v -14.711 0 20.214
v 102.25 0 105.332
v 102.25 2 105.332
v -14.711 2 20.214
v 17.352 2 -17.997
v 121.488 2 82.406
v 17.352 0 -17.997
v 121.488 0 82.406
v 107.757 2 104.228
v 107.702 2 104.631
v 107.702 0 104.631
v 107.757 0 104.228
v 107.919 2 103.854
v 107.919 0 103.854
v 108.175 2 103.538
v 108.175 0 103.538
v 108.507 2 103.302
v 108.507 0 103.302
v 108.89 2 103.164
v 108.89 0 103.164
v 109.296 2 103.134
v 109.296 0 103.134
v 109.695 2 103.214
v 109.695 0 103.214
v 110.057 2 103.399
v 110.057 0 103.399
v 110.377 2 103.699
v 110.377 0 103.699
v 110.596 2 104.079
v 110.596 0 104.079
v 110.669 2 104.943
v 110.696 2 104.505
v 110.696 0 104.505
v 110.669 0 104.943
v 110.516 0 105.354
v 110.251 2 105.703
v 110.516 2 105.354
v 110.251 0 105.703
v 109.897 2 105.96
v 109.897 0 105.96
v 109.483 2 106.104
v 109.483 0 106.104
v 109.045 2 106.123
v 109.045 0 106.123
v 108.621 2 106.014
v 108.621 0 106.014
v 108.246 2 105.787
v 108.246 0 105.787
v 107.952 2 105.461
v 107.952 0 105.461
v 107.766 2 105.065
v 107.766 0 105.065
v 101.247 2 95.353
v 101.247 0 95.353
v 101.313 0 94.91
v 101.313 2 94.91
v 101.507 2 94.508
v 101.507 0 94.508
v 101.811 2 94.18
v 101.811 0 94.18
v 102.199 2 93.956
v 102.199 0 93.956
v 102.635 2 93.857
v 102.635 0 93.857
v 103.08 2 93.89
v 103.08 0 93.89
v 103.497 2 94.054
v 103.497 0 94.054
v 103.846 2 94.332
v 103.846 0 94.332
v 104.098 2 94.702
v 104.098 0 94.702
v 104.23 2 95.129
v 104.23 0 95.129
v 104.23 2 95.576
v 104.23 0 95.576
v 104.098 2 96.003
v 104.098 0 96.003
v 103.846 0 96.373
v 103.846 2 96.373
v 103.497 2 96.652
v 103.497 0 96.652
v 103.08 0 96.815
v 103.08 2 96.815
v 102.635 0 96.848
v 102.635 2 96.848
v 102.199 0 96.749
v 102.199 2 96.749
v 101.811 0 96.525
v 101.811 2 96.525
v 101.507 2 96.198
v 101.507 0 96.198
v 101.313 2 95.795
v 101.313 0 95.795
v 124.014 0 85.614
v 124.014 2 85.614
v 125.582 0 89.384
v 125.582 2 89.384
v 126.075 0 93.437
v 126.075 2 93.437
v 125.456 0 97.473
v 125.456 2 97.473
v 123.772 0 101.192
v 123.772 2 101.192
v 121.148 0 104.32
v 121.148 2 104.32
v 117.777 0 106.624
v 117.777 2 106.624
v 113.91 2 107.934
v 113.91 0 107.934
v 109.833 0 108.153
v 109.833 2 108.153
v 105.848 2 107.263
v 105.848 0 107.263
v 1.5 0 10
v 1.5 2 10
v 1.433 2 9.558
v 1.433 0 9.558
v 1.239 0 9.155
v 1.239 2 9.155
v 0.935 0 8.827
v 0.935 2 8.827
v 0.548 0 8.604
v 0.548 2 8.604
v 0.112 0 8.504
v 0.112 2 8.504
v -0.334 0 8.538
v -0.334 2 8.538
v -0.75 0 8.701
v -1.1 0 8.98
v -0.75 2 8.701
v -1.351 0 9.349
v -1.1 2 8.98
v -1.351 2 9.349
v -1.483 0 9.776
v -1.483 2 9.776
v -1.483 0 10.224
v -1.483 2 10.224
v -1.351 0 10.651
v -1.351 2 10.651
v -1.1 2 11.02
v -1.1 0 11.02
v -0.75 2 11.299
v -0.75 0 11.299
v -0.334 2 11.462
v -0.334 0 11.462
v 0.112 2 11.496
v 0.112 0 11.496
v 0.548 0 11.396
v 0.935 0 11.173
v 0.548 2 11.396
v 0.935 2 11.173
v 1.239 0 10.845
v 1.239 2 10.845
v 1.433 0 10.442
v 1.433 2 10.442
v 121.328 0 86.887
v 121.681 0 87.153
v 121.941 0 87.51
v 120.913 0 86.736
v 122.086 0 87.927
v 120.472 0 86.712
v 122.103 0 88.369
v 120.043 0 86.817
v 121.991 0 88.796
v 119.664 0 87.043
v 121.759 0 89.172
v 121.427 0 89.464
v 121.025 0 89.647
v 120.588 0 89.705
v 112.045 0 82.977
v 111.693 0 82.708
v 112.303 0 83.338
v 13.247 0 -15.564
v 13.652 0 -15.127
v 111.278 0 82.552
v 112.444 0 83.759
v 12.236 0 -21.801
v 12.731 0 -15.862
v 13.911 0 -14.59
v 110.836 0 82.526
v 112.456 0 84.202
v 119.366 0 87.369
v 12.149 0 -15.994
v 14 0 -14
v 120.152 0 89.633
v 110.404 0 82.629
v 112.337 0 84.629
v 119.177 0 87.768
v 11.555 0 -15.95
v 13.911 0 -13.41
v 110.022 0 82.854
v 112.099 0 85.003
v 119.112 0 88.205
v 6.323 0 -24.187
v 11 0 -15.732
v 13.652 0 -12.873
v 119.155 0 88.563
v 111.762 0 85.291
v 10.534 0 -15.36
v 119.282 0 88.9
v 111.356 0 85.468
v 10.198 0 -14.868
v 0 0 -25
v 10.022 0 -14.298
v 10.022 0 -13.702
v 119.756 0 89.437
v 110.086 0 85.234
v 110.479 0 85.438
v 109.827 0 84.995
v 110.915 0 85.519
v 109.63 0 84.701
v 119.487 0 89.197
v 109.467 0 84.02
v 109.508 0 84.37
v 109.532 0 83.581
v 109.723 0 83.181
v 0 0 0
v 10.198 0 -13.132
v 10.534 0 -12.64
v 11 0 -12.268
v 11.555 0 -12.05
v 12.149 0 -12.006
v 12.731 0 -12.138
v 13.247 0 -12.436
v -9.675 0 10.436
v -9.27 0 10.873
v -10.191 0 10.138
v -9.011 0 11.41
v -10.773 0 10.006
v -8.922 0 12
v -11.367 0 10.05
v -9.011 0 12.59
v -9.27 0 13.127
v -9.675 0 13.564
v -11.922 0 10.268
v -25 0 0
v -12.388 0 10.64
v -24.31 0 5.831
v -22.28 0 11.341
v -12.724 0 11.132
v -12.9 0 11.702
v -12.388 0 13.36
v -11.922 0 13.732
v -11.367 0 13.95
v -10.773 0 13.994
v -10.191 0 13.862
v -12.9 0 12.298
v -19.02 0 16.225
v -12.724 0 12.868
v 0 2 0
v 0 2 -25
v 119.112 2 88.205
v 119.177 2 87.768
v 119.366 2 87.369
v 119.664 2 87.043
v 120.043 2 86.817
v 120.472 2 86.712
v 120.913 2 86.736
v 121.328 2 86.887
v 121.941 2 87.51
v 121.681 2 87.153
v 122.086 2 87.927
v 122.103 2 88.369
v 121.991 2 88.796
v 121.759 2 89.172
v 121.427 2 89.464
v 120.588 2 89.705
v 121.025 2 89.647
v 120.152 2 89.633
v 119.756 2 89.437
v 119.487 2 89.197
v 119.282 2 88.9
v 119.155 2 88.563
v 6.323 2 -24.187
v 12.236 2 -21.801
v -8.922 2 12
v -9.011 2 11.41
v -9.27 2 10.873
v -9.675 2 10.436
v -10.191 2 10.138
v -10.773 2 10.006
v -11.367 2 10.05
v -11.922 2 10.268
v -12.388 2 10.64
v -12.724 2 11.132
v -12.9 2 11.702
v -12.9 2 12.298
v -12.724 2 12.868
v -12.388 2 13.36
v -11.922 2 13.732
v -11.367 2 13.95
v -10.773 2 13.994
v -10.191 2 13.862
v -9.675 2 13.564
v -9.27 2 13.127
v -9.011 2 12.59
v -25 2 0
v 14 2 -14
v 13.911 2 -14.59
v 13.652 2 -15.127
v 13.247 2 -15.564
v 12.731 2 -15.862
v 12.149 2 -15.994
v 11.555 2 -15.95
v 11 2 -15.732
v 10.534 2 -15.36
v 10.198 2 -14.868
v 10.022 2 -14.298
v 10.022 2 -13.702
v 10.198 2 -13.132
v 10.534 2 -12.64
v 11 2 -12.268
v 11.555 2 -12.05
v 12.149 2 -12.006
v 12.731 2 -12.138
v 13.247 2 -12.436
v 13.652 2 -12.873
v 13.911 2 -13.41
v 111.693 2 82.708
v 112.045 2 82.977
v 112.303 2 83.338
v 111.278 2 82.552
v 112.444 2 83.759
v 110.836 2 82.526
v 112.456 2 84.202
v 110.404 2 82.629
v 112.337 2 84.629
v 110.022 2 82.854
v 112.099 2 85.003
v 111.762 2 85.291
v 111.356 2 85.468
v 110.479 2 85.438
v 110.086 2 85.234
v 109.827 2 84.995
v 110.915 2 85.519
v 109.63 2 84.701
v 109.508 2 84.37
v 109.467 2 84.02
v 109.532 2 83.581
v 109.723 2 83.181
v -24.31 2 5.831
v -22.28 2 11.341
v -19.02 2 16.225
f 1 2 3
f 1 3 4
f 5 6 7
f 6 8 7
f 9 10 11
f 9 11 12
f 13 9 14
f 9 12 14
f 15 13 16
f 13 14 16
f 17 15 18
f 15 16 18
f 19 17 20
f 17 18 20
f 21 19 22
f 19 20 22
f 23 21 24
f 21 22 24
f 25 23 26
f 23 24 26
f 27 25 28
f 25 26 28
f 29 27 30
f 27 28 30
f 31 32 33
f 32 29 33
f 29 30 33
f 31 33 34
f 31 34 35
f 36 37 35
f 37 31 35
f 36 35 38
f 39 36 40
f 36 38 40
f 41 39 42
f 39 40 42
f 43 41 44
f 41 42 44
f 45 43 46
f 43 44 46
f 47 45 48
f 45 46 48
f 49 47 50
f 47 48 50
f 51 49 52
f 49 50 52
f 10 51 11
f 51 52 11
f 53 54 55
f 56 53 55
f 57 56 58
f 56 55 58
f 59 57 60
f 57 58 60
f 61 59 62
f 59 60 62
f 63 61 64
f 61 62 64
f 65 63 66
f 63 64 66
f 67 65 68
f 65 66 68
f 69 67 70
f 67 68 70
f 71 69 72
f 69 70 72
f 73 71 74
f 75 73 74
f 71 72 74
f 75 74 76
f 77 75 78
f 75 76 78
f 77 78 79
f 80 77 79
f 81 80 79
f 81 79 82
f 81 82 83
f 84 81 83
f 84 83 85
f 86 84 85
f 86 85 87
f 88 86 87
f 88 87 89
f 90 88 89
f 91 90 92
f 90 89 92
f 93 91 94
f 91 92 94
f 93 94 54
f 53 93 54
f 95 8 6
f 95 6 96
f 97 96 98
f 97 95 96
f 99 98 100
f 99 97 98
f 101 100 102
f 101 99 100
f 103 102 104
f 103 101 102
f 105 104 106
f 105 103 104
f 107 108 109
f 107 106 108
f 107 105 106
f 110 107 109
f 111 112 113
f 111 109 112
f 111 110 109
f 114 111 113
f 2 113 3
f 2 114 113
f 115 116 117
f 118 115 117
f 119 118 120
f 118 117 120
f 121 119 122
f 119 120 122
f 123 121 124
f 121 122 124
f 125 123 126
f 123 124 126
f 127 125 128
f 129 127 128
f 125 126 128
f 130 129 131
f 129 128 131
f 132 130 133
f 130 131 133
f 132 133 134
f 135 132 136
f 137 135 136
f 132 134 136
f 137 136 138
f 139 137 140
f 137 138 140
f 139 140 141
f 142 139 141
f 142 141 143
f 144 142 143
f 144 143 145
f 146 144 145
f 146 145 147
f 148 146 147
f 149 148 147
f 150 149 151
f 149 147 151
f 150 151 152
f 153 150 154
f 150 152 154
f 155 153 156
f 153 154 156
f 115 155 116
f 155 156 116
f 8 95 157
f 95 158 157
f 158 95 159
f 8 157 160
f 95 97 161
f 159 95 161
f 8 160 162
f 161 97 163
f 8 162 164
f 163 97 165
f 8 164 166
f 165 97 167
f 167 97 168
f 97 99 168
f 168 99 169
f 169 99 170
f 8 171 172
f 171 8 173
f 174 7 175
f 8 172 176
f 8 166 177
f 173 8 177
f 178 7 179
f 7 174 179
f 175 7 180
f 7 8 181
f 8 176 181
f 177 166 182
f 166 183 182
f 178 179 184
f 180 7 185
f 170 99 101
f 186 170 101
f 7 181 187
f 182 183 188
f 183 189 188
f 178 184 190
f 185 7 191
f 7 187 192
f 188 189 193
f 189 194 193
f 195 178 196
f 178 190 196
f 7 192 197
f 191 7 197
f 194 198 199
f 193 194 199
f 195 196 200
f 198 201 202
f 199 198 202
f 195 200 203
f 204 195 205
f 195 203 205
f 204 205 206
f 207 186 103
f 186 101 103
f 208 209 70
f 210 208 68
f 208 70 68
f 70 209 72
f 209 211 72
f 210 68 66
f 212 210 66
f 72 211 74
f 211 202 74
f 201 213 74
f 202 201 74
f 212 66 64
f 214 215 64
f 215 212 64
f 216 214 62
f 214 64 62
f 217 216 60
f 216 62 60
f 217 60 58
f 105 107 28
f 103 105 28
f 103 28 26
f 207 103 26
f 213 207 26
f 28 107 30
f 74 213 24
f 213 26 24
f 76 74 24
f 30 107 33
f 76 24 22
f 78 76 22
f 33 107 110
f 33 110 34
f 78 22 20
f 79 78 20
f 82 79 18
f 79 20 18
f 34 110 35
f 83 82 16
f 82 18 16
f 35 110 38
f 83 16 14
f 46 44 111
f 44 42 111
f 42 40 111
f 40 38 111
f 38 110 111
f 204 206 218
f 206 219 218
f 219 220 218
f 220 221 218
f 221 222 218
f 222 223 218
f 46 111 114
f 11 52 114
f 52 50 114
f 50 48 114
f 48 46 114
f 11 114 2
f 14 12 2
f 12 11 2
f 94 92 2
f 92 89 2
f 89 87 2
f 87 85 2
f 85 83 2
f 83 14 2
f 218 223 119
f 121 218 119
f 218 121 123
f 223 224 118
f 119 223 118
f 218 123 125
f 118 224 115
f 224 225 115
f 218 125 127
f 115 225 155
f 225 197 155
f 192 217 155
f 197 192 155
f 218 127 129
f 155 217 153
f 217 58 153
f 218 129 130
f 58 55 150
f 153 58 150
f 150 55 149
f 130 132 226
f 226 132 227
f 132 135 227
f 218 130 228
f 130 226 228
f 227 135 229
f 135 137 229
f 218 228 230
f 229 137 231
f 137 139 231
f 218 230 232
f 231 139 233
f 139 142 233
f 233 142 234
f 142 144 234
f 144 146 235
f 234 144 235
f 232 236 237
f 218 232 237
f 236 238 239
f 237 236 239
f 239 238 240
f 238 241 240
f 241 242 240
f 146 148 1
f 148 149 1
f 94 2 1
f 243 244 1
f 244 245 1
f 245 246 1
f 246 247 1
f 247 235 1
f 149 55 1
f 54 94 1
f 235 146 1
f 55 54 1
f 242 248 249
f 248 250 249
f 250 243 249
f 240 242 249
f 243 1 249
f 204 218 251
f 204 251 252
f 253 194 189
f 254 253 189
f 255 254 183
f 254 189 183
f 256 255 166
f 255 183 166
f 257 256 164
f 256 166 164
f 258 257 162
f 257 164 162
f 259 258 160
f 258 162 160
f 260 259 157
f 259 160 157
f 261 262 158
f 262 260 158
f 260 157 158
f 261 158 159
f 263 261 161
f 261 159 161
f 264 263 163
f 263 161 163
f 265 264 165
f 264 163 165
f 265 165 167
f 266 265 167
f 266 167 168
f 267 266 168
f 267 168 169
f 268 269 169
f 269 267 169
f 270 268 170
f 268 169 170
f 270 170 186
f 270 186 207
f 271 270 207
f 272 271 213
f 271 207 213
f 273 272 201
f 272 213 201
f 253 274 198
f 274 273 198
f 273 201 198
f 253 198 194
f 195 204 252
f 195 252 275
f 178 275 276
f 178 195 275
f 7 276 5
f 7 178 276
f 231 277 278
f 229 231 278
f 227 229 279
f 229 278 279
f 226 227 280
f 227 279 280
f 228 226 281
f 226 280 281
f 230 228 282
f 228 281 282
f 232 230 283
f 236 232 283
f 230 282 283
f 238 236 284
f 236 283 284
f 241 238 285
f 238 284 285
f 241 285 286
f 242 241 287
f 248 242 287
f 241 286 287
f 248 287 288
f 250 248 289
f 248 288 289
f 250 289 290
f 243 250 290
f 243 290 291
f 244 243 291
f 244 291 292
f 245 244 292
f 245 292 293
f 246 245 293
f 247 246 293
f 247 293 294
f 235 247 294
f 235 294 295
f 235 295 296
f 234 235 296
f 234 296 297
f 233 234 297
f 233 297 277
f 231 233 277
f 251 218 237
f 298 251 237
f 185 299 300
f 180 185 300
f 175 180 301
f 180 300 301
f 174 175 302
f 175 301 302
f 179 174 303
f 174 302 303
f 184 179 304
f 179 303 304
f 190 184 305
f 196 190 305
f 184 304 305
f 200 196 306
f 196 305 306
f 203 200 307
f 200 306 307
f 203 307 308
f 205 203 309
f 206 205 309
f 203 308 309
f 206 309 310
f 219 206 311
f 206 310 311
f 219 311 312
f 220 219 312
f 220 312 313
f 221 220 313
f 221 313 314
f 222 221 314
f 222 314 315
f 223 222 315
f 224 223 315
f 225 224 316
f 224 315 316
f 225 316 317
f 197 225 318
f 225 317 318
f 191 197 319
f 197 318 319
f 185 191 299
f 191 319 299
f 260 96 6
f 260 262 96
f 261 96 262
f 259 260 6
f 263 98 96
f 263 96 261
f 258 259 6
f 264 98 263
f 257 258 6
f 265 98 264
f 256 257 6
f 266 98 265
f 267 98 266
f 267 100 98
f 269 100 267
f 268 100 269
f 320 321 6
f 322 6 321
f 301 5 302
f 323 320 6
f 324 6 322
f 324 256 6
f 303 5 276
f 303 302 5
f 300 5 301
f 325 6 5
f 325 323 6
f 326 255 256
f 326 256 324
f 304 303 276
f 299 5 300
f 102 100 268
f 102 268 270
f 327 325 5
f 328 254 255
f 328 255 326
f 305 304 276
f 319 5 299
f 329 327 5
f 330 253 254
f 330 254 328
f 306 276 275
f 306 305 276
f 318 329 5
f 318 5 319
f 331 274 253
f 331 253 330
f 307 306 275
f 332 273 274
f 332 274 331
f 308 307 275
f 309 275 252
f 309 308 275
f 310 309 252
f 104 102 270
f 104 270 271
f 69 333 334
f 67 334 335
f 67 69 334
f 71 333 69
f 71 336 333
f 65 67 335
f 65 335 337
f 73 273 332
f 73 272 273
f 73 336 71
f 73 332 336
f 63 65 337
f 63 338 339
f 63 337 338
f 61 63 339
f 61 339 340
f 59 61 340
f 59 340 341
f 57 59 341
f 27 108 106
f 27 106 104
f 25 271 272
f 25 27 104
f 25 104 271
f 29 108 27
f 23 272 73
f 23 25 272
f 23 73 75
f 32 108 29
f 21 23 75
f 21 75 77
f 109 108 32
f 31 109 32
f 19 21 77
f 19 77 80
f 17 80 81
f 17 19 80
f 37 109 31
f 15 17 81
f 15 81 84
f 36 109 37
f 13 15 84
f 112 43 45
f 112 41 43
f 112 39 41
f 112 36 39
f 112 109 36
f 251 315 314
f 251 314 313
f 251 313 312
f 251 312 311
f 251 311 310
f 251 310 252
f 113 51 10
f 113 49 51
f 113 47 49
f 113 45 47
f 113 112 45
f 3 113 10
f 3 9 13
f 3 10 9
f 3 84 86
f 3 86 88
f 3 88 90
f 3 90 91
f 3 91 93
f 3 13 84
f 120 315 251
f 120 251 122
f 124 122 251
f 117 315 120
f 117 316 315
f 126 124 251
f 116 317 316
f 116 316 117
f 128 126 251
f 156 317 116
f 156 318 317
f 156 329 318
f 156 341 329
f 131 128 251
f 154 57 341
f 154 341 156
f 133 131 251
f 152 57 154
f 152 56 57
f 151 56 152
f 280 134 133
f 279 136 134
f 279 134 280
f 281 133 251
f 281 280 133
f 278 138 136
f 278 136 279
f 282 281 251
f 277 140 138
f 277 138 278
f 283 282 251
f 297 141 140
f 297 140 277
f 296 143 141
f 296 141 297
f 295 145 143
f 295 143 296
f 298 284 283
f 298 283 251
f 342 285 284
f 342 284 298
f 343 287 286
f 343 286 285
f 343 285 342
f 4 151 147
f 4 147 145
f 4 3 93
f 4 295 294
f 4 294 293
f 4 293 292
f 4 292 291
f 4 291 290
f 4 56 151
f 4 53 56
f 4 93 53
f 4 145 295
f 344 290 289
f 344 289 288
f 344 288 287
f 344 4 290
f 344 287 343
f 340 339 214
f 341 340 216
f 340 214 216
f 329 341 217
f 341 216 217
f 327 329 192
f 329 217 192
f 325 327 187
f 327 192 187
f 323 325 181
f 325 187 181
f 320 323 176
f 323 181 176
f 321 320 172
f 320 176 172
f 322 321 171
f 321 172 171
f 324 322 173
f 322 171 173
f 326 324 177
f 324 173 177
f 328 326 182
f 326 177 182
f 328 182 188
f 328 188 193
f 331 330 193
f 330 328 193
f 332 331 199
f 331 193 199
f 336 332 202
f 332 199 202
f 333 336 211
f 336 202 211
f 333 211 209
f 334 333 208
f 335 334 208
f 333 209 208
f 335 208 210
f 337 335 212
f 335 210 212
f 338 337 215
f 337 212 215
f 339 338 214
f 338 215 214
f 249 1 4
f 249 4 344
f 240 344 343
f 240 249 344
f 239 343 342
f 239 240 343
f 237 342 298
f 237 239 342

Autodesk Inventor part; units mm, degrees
ref_plane "YZ Plane" through (0, 0, 0) normal (1, 0, 0) x (0, 1, 0)
ref_plane "XZ Plane" through (0, 0, 0) normal (0, 1, 0) x (-1, 0, 0)
ref_plane "XY Plane" through (0, 0, 0) normal (0, 0, 1) x (1, 0, 0)
sketch "Sketch1" plane through (0, 0, 0) normal (0, 1, 0) x (-1, 0, 0)
  line L0 (0, 0) -> (0, -25)
  line L1 (0, 0) -> (25, 0)
  line L2 (0, 0) -> (-107.2462, 89.9903)
  line L3 (0, 0) -> (140, 0) construction
  line L4 (-107.2462, 89.9903) -> (-102.7467, 95.3526)
  line L5 (-102.7467, 95.3526) -> (-110.9666, 84.0198)
  line L6 (-107.2462, 89.9903) -> (-114.9067, 96.4181)
  line L7 (-114.9067, 96.4181) -> (-120.6117, 88.2052)
  line L8 (-120.6117, 88.2052) -> (-109.2017, 104.6311)
  circle A0 centre (-109.2017, 104.6311) radius 1.5
  circle A1 centre (-102.7467, 95.3526) radius 1.5
  circle A2 centre (-110.9666, 84.0198) radius 1.5
  circle A3 centre (-120.6117, 88.2052) radius 1.5
  circle A4 centre (-111.0764, 93.2042) radius 15
  arc A5 (25, 0) -> (-19.1511, 16.0697) centre (0, 0) ccw
  arc A6 (-18.4671, 16.8513) -> (0, -25) centre (0, 0) ccw
  line L9 (-102.25, 105.3325) -> (14.7107, 20.2138)
  line L10 (-121.4878, 82.4058) -> (-17.3522, -17.9973)
  dimension "d0" = 25
  dimension "d1" = 25
  dimension "d2" = 140
  dimension "d3" = 140
  dimension "d4" = 7
  dimension "d5" = 14
  dimension "d6" = 10
  dimension "d7" = 10
  dimension "d8" = 20
  dimension "d9" = 3
  dimension "d10" = 3
  dimension "d11" = 3
  dimension "d12" = 3
  dimension "d13" = 30
extrude "Extrusion1" add sketch "Sketch1" along normal blind 2 contours L2 A5 L1 | L0 A6 L2 | A6 L10 A4 L2 | L2 A4 L9 A5 | L2 L4 A1 L5 | A4
sketch "Sketch2" plane through (0, 2, 0) normal (0, 1, 0) x (1, 0, 0)
  line L0 (0, 25) -> (0, 0) projected
  line L1 (0, 25) -> (0, 14)
  line L2 (0, 14) -> (12, 14)
  circle A0 centre (12, 14) radius 2
  line L3 (0, 25) -> (0, 0) projected
  line L4 (0, 0) -> (-10.922, 0)
  line L5 (0, 0) -> (-25, 0) projected
  line L6 (-10.922, 0) -> (-10.922, -12)
  circle A1 centre (-10.922, -12) radius 2
  dimension "d16" = 11
  dimension "d17" = 12
  dimension "d18" = 4
  dimension "d24" = 10.922
  dimension "d25" = 12
  dimension "d26" = 4
extrude "Extrusion2" cut sketch "Sketch2" against normal blind 2 contours A0
extrude "Extrusion3" cut sketch "Sketch2" against normal blind 2 contours A1
sketch "Sketch3" plane through (0, 2, 0) normal (0, 1, 0) x (1, 0, 0)
  line L0 (0, 25) -> (0, 0) projected
  line L1 (0, 0) -> (0, -10)
  circle A0 centre (0, -10) radius 1.5
  dimension "d29" = 10
  dimension "d30" = 3
extrude "Extrusion4" cut sketch "Sketch3" against normal blind 2
properties part number "arm"
